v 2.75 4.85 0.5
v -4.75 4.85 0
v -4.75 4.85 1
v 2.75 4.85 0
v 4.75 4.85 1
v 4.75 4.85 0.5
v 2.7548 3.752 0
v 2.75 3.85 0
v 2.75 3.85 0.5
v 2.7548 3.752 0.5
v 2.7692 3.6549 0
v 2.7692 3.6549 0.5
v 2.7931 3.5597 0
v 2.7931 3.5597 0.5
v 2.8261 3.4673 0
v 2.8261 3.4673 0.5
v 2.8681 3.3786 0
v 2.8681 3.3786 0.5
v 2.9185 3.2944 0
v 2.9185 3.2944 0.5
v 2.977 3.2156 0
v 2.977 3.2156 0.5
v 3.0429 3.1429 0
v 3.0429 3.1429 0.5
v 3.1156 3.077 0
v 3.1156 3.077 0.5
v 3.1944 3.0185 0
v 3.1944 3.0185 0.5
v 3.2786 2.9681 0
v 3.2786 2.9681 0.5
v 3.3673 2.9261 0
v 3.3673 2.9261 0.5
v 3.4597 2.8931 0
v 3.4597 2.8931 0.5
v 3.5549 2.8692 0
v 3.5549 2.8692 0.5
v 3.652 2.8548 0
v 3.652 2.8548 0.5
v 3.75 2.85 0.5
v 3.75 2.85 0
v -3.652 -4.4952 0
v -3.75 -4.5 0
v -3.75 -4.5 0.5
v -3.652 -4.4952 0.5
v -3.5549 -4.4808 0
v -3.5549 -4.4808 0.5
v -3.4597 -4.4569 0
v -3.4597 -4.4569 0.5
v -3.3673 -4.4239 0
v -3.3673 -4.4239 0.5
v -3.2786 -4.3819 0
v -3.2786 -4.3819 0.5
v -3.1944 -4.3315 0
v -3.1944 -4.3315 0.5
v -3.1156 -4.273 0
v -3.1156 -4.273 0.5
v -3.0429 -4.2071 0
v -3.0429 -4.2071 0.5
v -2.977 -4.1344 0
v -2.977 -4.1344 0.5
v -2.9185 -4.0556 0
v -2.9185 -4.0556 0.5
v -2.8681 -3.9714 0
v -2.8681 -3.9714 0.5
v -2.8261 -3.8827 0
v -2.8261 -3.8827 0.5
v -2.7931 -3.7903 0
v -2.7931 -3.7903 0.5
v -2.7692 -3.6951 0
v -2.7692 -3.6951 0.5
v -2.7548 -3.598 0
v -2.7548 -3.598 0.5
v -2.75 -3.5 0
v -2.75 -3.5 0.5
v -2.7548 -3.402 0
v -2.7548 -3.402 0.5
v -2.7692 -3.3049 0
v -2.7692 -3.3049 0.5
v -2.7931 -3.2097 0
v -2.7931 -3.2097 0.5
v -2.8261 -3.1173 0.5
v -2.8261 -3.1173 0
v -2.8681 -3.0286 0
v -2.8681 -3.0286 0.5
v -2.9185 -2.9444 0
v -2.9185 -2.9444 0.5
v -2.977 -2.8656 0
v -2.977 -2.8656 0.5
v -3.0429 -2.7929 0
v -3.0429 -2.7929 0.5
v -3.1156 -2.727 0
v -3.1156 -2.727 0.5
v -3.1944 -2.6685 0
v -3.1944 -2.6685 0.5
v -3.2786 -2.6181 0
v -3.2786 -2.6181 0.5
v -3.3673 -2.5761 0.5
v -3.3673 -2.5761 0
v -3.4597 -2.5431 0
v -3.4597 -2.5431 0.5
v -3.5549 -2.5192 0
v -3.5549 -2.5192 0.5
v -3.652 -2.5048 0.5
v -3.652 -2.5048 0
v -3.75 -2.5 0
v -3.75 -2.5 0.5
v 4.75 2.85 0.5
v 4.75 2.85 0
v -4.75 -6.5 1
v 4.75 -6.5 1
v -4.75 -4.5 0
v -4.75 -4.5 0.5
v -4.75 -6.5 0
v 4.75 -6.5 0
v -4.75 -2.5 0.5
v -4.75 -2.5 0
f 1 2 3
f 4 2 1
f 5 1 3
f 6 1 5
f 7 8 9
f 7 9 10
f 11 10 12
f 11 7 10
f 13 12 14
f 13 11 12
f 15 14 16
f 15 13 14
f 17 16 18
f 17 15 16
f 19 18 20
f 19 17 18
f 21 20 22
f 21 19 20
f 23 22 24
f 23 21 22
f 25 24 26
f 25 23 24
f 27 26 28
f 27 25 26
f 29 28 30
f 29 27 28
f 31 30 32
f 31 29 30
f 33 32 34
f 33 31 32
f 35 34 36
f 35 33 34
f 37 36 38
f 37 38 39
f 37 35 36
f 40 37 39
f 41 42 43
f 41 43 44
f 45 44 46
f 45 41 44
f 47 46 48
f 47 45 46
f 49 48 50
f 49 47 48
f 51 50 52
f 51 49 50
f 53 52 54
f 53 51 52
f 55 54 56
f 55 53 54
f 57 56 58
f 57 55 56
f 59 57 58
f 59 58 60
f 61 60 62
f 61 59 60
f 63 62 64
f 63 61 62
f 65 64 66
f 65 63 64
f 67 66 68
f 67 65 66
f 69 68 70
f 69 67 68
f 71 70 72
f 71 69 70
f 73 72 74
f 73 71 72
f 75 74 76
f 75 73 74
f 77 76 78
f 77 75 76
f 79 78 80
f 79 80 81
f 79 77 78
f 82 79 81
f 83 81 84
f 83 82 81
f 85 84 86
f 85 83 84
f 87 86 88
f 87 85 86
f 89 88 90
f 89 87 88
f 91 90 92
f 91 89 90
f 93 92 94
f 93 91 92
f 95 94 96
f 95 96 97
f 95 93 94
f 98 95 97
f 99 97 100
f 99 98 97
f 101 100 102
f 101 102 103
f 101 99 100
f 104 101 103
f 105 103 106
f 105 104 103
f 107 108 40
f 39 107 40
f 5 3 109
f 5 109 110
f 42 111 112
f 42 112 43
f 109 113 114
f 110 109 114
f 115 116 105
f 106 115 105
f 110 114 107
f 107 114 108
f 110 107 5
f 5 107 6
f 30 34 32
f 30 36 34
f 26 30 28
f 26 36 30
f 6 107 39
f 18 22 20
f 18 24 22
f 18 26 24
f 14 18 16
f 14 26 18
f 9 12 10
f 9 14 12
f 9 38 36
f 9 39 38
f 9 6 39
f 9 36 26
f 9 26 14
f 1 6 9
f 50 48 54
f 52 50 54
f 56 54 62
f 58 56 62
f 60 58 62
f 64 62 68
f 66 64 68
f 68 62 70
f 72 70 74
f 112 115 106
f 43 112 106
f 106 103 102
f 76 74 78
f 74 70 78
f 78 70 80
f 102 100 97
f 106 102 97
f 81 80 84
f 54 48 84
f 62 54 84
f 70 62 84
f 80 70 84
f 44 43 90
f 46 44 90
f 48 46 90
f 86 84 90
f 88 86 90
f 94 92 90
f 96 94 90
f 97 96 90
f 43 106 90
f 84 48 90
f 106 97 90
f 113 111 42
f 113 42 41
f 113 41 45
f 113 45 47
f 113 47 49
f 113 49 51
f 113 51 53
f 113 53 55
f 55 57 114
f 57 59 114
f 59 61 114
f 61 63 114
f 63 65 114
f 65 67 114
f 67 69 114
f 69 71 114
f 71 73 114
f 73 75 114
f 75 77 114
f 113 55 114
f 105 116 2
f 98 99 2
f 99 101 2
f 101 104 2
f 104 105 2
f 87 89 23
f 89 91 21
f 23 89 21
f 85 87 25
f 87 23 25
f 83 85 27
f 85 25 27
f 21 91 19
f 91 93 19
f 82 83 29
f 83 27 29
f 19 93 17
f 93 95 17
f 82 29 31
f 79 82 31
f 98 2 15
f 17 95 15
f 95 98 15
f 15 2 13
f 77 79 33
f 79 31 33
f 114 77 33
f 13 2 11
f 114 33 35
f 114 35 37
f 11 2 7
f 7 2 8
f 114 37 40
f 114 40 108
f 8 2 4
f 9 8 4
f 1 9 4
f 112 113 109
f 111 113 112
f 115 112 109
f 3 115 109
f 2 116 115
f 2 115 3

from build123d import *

# Parameters (mm, degrees)
SKETCH_W        = 9.5
SKETCH_H        = 11.35
PAD_DEPTH       = 1
POCKET002_DEPTH = 0.5
POCKET003_DEPTH = 0.5


with BuildPart() as part:
    # Sketch → Pad (new body)
    with BuildSketch(Plane.XY):
        with Locations((0, -0.825)):
            Rectangle(SKETCH_W, SKETCH_H)
    extrude(amount=PAD_DEPTH)

    # Sketch005 → Pocket002 (cut)
    with BuildSketch(Plane.XY):
        with BuildLine():
            Line((2.75, 4.85), (4.75, 4.85))
            Line((4.75, 4.85), (4.75, 2.85))
            Line((4.75, 2.85), (3.75, 2.85))
            ThreePointArc((2.75, 3.85), (3.042893, 3.142893), (3.75, 2.85))
            Line((2.75, 3.85), (2.75, 4.85))
        make_face()
    extrude(amount=POCKET002_DEPTH, mode=Mode.SUBTRACT)

    # Sketch006 → Pocket003 (cut)
    with BuildSketch(Plane.XY):
        with BuildLine():
            Line((-4.75, -2.5), (-4.75, -4.5))
            Line((-4.75, -4.5), (-3.75, -4.5))
            ThreePointArc((-3.75, -4.5), (-2.75, -3.5), (-3.75, -2.5))
            Line((-4.75, -2.5), (-3.75, -2.5))
        make_face()
    extrude(amount=POCKET003_DEPTH, mode=Mode.SUBTRACT)


solid = part.part
